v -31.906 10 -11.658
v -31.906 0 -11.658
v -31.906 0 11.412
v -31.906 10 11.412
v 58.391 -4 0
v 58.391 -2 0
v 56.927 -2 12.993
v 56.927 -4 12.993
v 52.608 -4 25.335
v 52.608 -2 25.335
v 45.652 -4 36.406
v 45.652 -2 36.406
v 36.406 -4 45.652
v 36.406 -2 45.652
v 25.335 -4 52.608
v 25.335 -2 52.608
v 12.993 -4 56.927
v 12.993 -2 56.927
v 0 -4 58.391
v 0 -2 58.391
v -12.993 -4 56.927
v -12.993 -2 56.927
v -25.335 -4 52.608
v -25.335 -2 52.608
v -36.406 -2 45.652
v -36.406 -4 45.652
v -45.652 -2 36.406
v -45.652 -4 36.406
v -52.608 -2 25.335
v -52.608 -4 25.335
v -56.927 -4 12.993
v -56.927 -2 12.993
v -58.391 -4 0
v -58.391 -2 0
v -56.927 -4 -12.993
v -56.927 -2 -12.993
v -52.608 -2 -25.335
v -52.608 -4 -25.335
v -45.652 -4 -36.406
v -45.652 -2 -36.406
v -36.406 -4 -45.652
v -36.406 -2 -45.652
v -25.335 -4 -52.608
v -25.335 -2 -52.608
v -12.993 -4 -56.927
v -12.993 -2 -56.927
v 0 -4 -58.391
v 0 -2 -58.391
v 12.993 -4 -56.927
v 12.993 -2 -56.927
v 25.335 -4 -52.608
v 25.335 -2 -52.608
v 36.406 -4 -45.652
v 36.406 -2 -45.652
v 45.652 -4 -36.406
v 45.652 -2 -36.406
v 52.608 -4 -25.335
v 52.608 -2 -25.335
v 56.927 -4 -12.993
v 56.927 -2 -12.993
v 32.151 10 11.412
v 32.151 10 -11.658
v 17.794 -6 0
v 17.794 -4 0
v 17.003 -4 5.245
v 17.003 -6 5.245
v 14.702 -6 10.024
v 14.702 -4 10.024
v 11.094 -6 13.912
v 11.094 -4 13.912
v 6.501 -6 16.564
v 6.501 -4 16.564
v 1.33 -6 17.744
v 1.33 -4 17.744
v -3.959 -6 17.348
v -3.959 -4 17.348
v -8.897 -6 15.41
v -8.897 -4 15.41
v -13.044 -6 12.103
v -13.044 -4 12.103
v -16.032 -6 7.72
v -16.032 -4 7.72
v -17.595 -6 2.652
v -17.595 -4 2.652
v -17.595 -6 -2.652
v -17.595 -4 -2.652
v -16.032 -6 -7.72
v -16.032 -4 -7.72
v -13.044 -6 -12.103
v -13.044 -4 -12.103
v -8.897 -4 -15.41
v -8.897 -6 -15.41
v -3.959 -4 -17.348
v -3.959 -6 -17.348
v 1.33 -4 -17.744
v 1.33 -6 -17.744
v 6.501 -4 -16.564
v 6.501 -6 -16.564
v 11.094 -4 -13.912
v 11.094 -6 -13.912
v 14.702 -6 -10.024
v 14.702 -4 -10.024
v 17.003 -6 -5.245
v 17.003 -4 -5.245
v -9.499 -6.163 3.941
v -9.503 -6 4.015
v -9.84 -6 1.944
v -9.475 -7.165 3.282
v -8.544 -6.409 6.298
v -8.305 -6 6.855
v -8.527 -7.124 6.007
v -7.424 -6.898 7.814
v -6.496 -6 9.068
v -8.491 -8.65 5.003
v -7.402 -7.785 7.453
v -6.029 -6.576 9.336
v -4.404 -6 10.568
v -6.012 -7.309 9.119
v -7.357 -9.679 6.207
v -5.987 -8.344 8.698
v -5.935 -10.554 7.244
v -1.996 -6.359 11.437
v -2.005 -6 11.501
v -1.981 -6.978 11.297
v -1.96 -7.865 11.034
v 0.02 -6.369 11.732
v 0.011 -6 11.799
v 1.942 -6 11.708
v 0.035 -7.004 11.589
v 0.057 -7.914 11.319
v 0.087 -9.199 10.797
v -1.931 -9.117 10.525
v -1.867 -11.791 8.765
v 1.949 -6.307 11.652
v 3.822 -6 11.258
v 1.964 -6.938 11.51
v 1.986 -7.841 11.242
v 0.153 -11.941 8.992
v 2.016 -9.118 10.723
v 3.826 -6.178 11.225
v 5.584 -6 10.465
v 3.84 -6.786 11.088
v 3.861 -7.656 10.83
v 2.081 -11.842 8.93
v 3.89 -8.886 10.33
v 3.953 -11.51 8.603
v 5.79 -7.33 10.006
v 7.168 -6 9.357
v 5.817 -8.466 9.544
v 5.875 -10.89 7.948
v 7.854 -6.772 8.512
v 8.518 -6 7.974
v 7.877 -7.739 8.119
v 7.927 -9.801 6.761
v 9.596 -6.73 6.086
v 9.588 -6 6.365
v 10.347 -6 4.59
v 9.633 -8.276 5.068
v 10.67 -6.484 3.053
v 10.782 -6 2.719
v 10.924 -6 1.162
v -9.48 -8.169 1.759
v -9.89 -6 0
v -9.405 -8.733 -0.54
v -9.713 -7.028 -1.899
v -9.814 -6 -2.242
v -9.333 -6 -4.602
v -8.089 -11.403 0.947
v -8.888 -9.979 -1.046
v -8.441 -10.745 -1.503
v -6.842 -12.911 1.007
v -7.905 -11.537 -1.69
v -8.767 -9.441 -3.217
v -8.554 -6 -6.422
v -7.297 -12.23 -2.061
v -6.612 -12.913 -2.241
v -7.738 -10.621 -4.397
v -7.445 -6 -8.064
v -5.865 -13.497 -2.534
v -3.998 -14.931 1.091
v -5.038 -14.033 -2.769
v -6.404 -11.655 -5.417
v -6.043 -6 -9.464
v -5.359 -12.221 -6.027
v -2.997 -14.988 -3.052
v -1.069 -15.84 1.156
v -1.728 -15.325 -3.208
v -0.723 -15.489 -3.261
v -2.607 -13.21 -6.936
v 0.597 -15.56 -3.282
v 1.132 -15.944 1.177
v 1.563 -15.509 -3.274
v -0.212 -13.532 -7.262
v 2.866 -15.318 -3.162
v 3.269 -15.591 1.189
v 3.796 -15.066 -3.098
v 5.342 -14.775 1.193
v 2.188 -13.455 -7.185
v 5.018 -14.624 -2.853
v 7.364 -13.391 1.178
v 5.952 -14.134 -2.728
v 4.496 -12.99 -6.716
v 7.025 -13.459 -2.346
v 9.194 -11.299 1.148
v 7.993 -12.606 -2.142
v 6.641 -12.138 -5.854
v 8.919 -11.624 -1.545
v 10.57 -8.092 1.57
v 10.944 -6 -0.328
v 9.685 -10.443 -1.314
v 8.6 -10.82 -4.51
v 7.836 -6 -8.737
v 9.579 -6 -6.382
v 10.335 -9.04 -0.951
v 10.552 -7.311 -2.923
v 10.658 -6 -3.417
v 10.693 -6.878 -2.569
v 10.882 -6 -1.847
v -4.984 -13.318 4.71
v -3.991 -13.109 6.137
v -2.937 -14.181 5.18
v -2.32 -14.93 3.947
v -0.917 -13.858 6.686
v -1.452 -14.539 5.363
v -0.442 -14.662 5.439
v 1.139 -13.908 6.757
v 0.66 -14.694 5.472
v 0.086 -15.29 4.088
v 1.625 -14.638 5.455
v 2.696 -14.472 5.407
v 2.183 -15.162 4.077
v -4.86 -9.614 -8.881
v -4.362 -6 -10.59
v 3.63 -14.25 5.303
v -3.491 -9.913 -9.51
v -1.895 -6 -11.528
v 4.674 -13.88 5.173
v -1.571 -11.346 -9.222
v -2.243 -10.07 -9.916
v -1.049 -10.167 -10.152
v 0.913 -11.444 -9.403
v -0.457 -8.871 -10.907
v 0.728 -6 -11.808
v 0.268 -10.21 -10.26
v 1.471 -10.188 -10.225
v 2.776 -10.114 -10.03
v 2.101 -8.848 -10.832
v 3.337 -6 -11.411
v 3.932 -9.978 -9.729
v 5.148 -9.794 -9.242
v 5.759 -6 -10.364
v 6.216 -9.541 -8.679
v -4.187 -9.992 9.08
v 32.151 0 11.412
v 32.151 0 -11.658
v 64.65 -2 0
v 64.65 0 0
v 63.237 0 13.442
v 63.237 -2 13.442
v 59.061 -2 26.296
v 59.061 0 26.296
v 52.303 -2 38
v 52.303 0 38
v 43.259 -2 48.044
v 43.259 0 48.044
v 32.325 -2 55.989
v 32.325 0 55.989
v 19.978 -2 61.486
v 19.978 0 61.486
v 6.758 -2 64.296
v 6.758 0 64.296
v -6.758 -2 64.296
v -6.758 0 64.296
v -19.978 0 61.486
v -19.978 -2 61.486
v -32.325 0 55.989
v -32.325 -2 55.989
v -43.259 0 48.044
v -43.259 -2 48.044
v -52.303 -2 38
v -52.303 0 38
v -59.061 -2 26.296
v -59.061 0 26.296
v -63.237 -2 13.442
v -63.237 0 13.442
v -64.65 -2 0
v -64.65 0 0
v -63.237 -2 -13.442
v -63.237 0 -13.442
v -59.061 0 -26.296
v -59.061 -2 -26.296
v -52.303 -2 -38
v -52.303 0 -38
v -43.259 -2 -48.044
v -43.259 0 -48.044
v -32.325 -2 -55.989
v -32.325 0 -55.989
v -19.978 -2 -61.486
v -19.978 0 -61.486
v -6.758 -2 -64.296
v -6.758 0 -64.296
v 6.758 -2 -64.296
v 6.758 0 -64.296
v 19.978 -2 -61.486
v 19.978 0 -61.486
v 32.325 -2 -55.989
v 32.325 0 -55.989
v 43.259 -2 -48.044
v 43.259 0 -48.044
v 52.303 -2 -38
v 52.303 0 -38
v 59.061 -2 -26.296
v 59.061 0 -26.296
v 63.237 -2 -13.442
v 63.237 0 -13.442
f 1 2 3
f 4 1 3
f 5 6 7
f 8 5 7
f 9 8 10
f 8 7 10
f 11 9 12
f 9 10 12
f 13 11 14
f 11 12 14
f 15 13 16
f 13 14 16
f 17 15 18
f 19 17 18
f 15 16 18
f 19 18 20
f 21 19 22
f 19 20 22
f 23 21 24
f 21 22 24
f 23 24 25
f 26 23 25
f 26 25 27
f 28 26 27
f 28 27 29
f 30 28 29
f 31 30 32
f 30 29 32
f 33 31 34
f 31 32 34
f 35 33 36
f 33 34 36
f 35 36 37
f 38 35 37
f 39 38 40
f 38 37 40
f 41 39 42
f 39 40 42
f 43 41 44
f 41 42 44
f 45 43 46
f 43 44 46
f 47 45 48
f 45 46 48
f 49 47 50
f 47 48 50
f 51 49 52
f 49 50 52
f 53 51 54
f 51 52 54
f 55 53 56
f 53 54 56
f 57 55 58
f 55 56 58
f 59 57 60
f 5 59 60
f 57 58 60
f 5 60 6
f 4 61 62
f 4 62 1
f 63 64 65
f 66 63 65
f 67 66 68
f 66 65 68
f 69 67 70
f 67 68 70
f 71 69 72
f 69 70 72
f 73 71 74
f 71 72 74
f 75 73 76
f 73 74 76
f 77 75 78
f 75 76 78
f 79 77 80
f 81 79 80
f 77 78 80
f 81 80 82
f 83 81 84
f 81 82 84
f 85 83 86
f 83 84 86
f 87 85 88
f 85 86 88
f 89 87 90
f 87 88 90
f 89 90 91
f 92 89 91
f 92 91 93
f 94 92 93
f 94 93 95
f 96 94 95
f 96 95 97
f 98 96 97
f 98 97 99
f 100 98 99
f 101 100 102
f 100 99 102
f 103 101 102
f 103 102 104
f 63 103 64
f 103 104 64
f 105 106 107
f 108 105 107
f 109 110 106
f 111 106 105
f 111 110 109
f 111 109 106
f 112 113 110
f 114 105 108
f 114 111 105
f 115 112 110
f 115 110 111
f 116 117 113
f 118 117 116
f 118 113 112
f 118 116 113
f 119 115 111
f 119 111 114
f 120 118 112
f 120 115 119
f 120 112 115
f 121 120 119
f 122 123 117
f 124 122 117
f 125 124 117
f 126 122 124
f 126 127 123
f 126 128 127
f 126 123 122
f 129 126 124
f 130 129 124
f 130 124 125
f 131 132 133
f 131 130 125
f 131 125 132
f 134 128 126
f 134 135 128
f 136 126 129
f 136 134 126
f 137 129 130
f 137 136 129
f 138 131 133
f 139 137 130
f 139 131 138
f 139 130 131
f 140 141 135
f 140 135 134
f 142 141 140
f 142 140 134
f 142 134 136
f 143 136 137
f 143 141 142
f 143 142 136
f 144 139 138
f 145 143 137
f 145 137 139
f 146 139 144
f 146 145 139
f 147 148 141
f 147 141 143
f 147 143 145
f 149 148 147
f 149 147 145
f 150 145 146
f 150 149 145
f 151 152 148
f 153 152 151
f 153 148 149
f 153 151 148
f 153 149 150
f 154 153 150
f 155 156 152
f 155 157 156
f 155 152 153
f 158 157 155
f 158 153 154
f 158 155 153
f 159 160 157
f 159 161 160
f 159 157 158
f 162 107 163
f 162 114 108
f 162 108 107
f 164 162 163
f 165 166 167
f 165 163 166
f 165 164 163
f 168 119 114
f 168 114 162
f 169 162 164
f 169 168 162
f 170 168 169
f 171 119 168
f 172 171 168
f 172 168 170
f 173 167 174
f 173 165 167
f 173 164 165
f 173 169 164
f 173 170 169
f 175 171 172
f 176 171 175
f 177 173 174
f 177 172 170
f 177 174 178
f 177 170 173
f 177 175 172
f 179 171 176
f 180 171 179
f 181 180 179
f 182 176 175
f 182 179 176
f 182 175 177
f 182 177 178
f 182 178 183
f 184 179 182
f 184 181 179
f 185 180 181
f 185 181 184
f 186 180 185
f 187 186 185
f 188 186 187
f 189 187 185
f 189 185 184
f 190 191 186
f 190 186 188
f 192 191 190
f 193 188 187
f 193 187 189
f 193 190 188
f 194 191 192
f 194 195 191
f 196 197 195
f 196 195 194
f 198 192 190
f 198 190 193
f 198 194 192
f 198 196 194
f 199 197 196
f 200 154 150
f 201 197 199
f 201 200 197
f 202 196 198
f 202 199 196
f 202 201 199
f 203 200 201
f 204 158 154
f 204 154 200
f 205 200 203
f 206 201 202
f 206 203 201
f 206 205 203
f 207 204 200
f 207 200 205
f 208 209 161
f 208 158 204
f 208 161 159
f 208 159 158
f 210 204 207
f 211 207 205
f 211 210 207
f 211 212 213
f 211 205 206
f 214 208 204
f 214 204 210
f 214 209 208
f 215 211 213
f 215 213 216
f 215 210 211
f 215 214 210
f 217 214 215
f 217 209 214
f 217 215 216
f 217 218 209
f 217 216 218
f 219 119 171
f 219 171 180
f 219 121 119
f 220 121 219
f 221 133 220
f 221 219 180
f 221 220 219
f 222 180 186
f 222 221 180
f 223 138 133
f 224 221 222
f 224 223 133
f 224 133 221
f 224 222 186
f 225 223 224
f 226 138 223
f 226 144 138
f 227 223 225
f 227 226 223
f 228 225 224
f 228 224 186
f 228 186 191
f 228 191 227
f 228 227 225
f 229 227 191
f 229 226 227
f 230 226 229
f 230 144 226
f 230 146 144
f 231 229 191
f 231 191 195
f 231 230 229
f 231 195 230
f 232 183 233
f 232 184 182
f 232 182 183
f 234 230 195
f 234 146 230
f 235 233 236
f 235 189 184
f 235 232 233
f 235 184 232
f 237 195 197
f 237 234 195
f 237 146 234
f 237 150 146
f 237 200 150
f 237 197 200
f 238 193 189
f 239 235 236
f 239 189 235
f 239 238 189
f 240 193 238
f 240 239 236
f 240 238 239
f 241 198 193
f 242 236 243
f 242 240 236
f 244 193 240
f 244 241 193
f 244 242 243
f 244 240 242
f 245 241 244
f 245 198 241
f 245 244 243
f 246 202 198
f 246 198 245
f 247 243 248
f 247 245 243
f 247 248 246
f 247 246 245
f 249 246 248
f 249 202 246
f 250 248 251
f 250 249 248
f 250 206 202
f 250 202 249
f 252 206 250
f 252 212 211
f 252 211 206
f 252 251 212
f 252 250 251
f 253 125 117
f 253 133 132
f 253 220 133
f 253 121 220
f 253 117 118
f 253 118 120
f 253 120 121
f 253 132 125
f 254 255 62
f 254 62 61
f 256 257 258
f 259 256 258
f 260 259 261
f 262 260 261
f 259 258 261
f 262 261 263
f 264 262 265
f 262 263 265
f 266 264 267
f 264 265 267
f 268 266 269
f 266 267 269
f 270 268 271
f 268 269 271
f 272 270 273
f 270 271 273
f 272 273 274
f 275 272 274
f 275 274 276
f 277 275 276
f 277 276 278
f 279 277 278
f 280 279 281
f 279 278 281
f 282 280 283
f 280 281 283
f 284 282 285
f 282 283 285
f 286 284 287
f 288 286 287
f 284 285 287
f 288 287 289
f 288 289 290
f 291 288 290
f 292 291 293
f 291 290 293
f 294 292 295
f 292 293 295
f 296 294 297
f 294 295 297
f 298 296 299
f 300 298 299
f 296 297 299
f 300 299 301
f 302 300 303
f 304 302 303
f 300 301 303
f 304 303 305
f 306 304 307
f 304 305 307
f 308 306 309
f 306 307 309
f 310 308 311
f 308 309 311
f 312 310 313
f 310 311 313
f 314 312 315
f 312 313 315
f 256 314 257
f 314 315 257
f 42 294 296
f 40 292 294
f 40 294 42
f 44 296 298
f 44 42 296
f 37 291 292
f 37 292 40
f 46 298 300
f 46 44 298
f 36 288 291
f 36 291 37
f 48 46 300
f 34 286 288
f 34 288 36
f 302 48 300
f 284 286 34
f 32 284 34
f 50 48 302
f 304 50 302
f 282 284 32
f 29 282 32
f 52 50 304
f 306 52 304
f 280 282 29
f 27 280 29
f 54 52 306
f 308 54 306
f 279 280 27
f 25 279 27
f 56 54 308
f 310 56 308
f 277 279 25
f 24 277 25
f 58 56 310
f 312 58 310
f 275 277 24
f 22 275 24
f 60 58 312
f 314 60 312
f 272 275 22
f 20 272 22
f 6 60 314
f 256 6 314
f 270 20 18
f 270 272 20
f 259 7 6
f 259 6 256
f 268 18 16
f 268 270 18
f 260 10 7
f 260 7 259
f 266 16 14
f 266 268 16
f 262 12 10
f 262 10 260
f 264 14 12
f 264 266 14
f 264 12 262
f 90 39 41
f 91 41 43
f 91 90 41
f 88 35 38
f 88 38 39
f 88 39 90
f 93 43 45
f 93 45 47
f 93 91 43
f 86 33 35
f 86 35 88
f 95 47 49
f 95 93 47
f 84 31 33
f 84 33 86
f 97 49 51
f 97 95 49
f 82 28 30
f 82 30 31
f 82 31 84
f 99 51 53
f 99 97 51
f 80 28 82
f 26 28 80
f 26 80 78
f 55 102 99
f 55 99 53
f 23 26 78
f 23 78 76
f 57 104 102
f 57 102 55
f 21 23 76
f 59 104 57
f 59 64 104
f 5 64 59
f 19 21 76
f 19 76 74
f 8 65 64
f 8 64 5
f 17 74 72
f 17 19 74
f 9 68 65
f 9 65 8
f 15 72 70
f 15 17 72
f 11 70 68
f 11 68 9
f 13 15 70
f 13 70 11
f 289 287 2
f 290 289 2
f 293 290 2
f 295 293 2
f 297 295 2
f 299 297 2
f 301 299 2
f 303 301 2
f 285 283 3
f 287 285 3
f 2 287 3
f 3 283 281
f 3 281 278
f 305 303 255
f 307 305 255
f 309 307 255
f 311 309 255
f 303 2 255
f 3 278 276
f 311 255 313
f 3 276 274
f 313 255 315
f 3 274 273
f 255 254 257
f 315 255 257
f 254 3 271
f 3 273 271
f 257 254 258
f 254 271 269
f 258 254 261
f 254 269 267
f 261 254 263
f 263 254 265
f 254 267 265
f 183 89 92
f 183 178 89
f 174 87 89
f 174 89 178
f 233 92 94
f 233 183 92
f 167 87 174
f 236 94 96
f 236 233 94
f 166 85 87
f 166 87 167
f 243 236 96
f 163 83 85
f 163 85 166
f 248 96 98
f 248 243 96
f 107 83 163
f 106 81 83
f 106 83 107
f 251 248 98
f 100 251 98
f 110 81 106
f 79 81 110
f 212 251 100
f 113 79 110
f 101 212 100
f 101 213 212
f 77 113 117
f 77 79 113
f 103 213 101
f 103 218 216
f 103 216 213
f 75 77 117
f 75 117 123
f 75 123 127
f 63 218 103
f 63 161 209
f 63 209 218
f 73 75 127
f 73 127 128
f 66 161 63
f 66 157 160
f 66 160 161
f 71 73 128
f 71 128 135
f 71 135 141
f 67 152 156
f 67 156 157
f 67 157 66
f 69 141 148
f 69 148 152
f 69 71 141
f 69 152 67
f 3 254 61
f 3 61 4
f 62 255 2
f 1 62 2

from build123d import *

# Parameters (mm, degrees)
F0_R     = 64.6501661092
F1_DEPTH = 2
F2_R     = 58.3906785059
F3_DEPTH = 2
F6_W     = 64.0570893884
F6_H     = 23.0703689158
F7_DEPTH = 10
F8_R     = 17.7936347266
F9_DEPTH = 2


with BuildPart() as f1:
    # F0 (on Front) → F1 (new body)
    with BuildSketch(Plane.XZ):
        Circle(F0_R)
    extrude(amount=F1_DEPTH)

    # F2 (on face) → F3 (join)
    with BuildSketch(Plane.XZ.offset(2)):
        Circle(F2_R)
    extrude(amount=F3_DEPTH)

    # F4 (on Top) → F5 (revolve)
    with BuildSketch(Plane.XY):
        with BuildLine():
            Line((10.7988948002, -3.8041563239), (-9.8171774298, -4.295015242))
            ThreePointArc((-9.8171774298, -4.295015242), (0.7757822444, -16.0163739159), (10.7988948002, -3.8041563239))
        make_face()
    revolve(axis=Axis((0.4908586852, -4.0495857829, 0), (0.9997166737, 0.0238027806, 0)))

    # F6 (on face) → F7 (join)
    with BuildSketch(Plane(origin=(0, 0, 0), x_dir=(-1, 0, 0), z_dir=(0, 1, 0))):
        with Locations((-0.1227147877, -0.1227147877)):
            Rectangle(F6_W, F6_H)
    extrude(amount=F7_DEPTH)

    # F8 (on face) → F9 (join)
    with BuildSketch(Plane.XZ.offset(4)):
        Circle(F8_R)
    extrude(amount=F9_DEPTH)


solid = f1.part
